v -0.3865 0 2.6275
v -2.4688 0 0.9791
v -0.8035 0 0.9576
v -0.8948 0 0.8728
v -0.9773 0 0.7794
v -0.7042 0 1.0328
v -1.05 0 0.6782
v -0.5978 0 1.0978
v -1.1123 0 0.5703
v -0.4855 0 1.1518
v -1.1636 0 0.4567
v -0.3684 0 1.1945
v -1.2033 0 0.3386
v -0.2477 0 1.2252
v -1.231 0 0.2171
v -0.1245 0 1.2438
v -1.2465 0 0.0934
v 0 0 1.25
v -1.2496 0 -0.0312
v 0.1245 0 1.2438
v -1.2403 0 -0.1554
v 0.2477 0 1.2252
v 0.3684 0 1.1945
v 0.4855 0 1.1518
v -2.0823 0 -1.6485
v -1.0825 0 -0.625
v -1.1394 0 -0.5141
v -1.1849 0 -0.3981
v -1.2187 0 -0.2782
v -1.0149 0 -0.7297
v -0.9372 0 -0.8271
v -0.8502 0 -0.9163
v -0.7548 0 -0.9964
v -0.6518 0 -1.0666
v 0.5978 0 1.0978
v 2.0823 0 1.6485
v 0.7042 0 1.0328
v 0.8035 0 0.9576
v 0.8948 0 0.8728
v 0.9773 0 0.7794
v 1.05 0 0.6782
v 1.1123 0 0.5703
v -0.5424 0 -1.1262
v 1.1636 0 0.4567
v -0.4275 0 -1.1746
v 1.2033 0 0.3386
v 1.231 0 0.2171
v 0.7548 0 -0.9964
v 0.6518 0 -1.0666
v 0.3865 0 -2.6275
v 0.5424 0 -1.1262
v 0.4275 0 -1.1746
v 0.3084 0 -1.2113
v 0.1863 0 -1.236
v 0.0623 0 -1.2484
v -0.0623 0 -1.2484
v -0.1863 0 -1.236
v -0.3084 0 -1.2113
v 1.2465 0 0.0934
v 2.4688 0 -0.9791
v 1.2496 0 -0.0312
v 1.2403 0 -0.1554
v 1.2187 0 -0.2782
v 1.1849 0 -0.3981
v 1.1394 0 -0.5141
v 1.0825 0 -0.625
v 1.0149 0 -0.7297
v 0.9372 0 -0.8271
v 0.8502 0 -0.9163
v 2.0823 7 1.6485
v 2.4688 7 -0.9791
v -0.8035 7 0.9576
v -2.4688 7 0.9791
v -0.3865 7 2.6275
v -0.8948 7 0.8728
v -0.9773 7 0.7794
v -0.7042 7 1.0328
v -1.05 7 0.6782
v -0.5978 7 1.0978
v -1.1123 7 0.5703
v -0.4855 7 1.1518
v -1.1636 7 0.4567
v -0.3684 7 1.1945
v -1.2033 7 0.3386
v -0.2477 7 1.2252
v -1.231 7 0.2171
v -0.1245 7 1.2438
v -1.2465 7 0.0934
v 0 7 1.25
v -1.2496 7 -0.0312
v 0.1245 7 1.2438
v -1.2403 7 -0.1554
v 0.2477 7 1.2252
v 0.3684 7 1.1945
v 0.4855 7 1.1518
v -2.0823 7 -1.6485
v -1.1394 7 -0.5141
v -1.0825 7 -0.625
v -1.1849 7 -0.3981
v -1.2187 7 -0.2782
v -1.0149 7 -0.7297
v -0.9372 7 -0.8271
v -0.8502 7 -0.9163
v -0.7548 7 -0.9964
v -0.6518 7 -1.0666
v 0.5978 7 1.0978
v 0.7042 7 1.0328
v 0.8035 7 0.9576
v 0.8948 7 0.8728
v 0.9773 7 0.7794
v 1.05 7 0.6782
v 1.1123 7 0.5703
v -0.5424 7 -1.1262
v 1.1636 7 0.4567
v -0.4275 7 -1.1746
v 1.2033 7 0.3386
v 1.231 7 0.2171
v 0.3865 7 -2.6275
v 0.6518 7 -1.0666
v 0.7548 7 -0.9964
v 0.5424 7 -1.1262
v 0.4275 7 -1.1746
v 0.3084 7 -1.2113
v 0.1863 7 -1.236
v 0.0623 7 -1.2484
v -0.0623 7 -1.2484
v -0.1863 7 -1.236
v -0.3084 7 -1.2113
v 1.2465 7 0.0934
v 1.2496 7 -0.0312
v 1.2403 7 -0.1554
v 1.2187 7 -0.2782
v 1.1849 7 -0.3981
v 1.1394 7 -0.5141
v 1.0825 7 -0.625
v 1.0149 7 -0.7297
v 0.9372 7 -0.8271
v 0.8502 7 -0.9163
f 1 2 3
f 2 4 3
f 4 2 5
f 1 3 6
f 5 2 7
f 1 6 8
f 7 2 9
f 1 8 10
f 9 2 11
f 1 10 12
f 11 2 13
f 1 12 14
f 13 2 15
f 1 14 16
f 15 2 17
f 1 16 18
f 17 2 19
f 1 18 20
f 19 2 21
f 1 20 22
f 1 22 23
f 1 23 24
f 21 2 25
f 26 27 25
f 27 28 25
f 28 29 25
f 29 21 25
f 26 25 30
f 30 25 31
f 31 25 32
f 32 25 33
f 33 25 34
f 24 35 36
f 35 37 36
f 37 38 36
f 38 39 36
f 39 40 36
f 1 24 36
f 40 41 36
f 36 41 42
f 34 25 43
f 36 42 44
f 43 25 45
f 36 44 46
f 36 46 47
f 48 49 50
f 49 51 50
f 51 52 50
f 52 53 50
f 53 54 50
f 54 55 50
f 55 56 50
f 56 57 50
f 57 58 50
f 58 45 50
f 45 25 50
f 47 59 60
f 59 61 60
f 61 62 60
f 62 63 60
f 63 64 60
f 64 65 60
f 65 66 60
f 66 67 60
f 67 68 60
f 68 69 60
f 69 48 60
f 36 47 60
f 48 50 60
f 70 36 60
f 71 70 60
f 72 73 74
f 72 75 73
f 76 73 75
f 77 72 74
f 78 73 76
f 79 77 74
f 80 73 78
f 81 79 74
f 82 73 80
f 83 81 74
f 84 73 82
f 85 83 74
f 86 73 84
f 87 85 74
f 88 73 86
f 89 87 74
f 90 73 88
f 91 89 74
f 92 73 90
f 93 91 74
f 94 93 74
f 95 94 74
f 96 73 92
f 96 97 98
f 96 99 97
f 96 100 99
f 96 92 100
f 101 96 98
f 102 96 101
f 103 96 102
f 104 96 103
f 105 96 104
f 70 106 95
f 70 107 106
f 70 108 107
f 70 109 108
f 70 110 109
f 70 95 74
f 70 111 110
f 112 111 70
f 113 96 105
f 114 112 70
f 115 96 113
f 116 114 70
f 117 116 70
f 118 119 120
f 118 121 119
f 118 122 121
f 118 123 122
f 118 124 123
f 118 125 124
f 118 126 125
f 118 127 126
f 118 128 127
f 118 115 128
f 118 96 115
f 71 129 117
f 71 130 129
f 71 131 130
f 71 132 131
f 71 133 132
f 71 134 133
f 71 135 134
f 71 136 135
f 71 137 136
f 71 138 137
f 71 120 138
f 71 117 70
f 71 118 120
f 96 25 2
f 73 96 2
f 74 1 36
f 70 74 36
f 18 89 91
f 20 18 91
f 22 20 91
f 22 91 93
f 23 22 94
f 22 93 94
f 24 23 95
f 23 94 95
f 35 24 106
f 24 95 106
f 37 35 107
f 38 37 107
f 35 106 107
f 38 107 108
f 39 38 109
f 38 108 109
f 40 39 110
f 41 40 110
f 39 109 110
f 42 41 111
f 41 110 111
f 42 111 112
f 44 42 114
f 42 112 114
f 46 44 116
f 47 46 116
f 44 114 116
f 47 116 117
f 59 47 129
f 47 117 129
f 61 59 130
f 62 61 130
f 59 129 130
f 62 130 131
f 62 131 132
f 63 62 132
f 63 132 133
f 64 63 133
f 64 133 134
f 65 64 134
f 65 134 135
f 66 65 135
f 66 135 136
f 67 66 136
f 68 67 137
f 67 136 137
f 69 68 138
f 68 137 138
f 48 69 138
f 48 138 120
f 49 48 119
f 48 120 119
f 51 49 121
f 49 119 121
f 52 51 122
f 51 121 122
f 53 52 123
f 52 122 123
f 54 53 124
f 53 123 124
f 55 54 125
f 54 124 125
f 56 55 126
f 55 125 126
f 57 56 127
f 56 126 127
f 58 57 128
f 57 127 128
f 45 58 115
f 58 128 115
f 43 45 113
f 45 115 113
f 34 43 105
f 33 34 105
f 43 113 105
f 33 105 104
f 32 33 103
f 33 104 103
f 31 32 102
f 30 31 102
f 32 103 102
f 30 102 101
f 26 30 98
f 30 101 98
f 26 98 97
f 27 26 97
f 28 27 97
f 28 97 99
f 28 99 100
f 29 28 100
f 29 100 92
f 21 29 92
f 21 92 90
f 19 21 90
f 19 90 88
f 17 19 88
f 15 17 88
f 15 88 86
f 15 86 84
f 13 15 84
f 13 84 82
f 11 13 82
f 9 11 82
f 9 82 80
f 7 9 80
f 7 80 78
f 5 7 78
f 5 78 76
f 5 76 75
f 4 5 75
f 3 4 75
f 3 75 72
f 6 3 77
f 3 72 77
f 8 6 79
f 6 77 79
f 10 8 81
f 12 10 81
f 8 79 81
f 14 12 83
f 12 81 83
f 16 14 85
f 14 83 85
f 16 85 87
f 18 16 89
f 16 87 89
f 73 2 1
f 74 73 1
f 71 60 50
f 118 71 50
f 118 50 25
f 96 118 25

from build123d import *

# Parameters (mm, degrees)
SALIENTE_EXTRUIR1_DEPTH = 7
CROQUIS_CARA_R          = 1.25
CORTAR_EXTRUIR1_DEPTH   = 7


with BuildPart() as part:
    # Croquis base → Saliente-Extruir1 (new body)
    with BuildSketch(Plane(origin=(0, 0, 0), x_dir=(1, 0, 0), z_dir=(0, 1, 0))):
        Polygon((2.082277712, -1.648469855), (2.468755628, 0.979070469), (0.386477916, 2.627540324), (-2.082277712, 1.648469855), (-2.468755628, -0.979070469), (-0.386477916, -2.627540324), align=None)
    extrude(amount=SALIENTE_EXTRUIR1_DEPTH)

    # Croquis cara → Cortar-Extruir1 (cut)
    with BuildSketch(Plane(origin=(0, 7, 0), x_dir=(1, 0, 0), z_dir=(0, 1, 0))):
        with Locations(Location((0, 0, 0), (0, 0, 270))):
            Circle(CROQUIS_CARA_R)
    extrude(amount=-CORTAR_EXTRUIR1_DEPTH, mode=Mode.SUBTRACT)


solid = part.part
